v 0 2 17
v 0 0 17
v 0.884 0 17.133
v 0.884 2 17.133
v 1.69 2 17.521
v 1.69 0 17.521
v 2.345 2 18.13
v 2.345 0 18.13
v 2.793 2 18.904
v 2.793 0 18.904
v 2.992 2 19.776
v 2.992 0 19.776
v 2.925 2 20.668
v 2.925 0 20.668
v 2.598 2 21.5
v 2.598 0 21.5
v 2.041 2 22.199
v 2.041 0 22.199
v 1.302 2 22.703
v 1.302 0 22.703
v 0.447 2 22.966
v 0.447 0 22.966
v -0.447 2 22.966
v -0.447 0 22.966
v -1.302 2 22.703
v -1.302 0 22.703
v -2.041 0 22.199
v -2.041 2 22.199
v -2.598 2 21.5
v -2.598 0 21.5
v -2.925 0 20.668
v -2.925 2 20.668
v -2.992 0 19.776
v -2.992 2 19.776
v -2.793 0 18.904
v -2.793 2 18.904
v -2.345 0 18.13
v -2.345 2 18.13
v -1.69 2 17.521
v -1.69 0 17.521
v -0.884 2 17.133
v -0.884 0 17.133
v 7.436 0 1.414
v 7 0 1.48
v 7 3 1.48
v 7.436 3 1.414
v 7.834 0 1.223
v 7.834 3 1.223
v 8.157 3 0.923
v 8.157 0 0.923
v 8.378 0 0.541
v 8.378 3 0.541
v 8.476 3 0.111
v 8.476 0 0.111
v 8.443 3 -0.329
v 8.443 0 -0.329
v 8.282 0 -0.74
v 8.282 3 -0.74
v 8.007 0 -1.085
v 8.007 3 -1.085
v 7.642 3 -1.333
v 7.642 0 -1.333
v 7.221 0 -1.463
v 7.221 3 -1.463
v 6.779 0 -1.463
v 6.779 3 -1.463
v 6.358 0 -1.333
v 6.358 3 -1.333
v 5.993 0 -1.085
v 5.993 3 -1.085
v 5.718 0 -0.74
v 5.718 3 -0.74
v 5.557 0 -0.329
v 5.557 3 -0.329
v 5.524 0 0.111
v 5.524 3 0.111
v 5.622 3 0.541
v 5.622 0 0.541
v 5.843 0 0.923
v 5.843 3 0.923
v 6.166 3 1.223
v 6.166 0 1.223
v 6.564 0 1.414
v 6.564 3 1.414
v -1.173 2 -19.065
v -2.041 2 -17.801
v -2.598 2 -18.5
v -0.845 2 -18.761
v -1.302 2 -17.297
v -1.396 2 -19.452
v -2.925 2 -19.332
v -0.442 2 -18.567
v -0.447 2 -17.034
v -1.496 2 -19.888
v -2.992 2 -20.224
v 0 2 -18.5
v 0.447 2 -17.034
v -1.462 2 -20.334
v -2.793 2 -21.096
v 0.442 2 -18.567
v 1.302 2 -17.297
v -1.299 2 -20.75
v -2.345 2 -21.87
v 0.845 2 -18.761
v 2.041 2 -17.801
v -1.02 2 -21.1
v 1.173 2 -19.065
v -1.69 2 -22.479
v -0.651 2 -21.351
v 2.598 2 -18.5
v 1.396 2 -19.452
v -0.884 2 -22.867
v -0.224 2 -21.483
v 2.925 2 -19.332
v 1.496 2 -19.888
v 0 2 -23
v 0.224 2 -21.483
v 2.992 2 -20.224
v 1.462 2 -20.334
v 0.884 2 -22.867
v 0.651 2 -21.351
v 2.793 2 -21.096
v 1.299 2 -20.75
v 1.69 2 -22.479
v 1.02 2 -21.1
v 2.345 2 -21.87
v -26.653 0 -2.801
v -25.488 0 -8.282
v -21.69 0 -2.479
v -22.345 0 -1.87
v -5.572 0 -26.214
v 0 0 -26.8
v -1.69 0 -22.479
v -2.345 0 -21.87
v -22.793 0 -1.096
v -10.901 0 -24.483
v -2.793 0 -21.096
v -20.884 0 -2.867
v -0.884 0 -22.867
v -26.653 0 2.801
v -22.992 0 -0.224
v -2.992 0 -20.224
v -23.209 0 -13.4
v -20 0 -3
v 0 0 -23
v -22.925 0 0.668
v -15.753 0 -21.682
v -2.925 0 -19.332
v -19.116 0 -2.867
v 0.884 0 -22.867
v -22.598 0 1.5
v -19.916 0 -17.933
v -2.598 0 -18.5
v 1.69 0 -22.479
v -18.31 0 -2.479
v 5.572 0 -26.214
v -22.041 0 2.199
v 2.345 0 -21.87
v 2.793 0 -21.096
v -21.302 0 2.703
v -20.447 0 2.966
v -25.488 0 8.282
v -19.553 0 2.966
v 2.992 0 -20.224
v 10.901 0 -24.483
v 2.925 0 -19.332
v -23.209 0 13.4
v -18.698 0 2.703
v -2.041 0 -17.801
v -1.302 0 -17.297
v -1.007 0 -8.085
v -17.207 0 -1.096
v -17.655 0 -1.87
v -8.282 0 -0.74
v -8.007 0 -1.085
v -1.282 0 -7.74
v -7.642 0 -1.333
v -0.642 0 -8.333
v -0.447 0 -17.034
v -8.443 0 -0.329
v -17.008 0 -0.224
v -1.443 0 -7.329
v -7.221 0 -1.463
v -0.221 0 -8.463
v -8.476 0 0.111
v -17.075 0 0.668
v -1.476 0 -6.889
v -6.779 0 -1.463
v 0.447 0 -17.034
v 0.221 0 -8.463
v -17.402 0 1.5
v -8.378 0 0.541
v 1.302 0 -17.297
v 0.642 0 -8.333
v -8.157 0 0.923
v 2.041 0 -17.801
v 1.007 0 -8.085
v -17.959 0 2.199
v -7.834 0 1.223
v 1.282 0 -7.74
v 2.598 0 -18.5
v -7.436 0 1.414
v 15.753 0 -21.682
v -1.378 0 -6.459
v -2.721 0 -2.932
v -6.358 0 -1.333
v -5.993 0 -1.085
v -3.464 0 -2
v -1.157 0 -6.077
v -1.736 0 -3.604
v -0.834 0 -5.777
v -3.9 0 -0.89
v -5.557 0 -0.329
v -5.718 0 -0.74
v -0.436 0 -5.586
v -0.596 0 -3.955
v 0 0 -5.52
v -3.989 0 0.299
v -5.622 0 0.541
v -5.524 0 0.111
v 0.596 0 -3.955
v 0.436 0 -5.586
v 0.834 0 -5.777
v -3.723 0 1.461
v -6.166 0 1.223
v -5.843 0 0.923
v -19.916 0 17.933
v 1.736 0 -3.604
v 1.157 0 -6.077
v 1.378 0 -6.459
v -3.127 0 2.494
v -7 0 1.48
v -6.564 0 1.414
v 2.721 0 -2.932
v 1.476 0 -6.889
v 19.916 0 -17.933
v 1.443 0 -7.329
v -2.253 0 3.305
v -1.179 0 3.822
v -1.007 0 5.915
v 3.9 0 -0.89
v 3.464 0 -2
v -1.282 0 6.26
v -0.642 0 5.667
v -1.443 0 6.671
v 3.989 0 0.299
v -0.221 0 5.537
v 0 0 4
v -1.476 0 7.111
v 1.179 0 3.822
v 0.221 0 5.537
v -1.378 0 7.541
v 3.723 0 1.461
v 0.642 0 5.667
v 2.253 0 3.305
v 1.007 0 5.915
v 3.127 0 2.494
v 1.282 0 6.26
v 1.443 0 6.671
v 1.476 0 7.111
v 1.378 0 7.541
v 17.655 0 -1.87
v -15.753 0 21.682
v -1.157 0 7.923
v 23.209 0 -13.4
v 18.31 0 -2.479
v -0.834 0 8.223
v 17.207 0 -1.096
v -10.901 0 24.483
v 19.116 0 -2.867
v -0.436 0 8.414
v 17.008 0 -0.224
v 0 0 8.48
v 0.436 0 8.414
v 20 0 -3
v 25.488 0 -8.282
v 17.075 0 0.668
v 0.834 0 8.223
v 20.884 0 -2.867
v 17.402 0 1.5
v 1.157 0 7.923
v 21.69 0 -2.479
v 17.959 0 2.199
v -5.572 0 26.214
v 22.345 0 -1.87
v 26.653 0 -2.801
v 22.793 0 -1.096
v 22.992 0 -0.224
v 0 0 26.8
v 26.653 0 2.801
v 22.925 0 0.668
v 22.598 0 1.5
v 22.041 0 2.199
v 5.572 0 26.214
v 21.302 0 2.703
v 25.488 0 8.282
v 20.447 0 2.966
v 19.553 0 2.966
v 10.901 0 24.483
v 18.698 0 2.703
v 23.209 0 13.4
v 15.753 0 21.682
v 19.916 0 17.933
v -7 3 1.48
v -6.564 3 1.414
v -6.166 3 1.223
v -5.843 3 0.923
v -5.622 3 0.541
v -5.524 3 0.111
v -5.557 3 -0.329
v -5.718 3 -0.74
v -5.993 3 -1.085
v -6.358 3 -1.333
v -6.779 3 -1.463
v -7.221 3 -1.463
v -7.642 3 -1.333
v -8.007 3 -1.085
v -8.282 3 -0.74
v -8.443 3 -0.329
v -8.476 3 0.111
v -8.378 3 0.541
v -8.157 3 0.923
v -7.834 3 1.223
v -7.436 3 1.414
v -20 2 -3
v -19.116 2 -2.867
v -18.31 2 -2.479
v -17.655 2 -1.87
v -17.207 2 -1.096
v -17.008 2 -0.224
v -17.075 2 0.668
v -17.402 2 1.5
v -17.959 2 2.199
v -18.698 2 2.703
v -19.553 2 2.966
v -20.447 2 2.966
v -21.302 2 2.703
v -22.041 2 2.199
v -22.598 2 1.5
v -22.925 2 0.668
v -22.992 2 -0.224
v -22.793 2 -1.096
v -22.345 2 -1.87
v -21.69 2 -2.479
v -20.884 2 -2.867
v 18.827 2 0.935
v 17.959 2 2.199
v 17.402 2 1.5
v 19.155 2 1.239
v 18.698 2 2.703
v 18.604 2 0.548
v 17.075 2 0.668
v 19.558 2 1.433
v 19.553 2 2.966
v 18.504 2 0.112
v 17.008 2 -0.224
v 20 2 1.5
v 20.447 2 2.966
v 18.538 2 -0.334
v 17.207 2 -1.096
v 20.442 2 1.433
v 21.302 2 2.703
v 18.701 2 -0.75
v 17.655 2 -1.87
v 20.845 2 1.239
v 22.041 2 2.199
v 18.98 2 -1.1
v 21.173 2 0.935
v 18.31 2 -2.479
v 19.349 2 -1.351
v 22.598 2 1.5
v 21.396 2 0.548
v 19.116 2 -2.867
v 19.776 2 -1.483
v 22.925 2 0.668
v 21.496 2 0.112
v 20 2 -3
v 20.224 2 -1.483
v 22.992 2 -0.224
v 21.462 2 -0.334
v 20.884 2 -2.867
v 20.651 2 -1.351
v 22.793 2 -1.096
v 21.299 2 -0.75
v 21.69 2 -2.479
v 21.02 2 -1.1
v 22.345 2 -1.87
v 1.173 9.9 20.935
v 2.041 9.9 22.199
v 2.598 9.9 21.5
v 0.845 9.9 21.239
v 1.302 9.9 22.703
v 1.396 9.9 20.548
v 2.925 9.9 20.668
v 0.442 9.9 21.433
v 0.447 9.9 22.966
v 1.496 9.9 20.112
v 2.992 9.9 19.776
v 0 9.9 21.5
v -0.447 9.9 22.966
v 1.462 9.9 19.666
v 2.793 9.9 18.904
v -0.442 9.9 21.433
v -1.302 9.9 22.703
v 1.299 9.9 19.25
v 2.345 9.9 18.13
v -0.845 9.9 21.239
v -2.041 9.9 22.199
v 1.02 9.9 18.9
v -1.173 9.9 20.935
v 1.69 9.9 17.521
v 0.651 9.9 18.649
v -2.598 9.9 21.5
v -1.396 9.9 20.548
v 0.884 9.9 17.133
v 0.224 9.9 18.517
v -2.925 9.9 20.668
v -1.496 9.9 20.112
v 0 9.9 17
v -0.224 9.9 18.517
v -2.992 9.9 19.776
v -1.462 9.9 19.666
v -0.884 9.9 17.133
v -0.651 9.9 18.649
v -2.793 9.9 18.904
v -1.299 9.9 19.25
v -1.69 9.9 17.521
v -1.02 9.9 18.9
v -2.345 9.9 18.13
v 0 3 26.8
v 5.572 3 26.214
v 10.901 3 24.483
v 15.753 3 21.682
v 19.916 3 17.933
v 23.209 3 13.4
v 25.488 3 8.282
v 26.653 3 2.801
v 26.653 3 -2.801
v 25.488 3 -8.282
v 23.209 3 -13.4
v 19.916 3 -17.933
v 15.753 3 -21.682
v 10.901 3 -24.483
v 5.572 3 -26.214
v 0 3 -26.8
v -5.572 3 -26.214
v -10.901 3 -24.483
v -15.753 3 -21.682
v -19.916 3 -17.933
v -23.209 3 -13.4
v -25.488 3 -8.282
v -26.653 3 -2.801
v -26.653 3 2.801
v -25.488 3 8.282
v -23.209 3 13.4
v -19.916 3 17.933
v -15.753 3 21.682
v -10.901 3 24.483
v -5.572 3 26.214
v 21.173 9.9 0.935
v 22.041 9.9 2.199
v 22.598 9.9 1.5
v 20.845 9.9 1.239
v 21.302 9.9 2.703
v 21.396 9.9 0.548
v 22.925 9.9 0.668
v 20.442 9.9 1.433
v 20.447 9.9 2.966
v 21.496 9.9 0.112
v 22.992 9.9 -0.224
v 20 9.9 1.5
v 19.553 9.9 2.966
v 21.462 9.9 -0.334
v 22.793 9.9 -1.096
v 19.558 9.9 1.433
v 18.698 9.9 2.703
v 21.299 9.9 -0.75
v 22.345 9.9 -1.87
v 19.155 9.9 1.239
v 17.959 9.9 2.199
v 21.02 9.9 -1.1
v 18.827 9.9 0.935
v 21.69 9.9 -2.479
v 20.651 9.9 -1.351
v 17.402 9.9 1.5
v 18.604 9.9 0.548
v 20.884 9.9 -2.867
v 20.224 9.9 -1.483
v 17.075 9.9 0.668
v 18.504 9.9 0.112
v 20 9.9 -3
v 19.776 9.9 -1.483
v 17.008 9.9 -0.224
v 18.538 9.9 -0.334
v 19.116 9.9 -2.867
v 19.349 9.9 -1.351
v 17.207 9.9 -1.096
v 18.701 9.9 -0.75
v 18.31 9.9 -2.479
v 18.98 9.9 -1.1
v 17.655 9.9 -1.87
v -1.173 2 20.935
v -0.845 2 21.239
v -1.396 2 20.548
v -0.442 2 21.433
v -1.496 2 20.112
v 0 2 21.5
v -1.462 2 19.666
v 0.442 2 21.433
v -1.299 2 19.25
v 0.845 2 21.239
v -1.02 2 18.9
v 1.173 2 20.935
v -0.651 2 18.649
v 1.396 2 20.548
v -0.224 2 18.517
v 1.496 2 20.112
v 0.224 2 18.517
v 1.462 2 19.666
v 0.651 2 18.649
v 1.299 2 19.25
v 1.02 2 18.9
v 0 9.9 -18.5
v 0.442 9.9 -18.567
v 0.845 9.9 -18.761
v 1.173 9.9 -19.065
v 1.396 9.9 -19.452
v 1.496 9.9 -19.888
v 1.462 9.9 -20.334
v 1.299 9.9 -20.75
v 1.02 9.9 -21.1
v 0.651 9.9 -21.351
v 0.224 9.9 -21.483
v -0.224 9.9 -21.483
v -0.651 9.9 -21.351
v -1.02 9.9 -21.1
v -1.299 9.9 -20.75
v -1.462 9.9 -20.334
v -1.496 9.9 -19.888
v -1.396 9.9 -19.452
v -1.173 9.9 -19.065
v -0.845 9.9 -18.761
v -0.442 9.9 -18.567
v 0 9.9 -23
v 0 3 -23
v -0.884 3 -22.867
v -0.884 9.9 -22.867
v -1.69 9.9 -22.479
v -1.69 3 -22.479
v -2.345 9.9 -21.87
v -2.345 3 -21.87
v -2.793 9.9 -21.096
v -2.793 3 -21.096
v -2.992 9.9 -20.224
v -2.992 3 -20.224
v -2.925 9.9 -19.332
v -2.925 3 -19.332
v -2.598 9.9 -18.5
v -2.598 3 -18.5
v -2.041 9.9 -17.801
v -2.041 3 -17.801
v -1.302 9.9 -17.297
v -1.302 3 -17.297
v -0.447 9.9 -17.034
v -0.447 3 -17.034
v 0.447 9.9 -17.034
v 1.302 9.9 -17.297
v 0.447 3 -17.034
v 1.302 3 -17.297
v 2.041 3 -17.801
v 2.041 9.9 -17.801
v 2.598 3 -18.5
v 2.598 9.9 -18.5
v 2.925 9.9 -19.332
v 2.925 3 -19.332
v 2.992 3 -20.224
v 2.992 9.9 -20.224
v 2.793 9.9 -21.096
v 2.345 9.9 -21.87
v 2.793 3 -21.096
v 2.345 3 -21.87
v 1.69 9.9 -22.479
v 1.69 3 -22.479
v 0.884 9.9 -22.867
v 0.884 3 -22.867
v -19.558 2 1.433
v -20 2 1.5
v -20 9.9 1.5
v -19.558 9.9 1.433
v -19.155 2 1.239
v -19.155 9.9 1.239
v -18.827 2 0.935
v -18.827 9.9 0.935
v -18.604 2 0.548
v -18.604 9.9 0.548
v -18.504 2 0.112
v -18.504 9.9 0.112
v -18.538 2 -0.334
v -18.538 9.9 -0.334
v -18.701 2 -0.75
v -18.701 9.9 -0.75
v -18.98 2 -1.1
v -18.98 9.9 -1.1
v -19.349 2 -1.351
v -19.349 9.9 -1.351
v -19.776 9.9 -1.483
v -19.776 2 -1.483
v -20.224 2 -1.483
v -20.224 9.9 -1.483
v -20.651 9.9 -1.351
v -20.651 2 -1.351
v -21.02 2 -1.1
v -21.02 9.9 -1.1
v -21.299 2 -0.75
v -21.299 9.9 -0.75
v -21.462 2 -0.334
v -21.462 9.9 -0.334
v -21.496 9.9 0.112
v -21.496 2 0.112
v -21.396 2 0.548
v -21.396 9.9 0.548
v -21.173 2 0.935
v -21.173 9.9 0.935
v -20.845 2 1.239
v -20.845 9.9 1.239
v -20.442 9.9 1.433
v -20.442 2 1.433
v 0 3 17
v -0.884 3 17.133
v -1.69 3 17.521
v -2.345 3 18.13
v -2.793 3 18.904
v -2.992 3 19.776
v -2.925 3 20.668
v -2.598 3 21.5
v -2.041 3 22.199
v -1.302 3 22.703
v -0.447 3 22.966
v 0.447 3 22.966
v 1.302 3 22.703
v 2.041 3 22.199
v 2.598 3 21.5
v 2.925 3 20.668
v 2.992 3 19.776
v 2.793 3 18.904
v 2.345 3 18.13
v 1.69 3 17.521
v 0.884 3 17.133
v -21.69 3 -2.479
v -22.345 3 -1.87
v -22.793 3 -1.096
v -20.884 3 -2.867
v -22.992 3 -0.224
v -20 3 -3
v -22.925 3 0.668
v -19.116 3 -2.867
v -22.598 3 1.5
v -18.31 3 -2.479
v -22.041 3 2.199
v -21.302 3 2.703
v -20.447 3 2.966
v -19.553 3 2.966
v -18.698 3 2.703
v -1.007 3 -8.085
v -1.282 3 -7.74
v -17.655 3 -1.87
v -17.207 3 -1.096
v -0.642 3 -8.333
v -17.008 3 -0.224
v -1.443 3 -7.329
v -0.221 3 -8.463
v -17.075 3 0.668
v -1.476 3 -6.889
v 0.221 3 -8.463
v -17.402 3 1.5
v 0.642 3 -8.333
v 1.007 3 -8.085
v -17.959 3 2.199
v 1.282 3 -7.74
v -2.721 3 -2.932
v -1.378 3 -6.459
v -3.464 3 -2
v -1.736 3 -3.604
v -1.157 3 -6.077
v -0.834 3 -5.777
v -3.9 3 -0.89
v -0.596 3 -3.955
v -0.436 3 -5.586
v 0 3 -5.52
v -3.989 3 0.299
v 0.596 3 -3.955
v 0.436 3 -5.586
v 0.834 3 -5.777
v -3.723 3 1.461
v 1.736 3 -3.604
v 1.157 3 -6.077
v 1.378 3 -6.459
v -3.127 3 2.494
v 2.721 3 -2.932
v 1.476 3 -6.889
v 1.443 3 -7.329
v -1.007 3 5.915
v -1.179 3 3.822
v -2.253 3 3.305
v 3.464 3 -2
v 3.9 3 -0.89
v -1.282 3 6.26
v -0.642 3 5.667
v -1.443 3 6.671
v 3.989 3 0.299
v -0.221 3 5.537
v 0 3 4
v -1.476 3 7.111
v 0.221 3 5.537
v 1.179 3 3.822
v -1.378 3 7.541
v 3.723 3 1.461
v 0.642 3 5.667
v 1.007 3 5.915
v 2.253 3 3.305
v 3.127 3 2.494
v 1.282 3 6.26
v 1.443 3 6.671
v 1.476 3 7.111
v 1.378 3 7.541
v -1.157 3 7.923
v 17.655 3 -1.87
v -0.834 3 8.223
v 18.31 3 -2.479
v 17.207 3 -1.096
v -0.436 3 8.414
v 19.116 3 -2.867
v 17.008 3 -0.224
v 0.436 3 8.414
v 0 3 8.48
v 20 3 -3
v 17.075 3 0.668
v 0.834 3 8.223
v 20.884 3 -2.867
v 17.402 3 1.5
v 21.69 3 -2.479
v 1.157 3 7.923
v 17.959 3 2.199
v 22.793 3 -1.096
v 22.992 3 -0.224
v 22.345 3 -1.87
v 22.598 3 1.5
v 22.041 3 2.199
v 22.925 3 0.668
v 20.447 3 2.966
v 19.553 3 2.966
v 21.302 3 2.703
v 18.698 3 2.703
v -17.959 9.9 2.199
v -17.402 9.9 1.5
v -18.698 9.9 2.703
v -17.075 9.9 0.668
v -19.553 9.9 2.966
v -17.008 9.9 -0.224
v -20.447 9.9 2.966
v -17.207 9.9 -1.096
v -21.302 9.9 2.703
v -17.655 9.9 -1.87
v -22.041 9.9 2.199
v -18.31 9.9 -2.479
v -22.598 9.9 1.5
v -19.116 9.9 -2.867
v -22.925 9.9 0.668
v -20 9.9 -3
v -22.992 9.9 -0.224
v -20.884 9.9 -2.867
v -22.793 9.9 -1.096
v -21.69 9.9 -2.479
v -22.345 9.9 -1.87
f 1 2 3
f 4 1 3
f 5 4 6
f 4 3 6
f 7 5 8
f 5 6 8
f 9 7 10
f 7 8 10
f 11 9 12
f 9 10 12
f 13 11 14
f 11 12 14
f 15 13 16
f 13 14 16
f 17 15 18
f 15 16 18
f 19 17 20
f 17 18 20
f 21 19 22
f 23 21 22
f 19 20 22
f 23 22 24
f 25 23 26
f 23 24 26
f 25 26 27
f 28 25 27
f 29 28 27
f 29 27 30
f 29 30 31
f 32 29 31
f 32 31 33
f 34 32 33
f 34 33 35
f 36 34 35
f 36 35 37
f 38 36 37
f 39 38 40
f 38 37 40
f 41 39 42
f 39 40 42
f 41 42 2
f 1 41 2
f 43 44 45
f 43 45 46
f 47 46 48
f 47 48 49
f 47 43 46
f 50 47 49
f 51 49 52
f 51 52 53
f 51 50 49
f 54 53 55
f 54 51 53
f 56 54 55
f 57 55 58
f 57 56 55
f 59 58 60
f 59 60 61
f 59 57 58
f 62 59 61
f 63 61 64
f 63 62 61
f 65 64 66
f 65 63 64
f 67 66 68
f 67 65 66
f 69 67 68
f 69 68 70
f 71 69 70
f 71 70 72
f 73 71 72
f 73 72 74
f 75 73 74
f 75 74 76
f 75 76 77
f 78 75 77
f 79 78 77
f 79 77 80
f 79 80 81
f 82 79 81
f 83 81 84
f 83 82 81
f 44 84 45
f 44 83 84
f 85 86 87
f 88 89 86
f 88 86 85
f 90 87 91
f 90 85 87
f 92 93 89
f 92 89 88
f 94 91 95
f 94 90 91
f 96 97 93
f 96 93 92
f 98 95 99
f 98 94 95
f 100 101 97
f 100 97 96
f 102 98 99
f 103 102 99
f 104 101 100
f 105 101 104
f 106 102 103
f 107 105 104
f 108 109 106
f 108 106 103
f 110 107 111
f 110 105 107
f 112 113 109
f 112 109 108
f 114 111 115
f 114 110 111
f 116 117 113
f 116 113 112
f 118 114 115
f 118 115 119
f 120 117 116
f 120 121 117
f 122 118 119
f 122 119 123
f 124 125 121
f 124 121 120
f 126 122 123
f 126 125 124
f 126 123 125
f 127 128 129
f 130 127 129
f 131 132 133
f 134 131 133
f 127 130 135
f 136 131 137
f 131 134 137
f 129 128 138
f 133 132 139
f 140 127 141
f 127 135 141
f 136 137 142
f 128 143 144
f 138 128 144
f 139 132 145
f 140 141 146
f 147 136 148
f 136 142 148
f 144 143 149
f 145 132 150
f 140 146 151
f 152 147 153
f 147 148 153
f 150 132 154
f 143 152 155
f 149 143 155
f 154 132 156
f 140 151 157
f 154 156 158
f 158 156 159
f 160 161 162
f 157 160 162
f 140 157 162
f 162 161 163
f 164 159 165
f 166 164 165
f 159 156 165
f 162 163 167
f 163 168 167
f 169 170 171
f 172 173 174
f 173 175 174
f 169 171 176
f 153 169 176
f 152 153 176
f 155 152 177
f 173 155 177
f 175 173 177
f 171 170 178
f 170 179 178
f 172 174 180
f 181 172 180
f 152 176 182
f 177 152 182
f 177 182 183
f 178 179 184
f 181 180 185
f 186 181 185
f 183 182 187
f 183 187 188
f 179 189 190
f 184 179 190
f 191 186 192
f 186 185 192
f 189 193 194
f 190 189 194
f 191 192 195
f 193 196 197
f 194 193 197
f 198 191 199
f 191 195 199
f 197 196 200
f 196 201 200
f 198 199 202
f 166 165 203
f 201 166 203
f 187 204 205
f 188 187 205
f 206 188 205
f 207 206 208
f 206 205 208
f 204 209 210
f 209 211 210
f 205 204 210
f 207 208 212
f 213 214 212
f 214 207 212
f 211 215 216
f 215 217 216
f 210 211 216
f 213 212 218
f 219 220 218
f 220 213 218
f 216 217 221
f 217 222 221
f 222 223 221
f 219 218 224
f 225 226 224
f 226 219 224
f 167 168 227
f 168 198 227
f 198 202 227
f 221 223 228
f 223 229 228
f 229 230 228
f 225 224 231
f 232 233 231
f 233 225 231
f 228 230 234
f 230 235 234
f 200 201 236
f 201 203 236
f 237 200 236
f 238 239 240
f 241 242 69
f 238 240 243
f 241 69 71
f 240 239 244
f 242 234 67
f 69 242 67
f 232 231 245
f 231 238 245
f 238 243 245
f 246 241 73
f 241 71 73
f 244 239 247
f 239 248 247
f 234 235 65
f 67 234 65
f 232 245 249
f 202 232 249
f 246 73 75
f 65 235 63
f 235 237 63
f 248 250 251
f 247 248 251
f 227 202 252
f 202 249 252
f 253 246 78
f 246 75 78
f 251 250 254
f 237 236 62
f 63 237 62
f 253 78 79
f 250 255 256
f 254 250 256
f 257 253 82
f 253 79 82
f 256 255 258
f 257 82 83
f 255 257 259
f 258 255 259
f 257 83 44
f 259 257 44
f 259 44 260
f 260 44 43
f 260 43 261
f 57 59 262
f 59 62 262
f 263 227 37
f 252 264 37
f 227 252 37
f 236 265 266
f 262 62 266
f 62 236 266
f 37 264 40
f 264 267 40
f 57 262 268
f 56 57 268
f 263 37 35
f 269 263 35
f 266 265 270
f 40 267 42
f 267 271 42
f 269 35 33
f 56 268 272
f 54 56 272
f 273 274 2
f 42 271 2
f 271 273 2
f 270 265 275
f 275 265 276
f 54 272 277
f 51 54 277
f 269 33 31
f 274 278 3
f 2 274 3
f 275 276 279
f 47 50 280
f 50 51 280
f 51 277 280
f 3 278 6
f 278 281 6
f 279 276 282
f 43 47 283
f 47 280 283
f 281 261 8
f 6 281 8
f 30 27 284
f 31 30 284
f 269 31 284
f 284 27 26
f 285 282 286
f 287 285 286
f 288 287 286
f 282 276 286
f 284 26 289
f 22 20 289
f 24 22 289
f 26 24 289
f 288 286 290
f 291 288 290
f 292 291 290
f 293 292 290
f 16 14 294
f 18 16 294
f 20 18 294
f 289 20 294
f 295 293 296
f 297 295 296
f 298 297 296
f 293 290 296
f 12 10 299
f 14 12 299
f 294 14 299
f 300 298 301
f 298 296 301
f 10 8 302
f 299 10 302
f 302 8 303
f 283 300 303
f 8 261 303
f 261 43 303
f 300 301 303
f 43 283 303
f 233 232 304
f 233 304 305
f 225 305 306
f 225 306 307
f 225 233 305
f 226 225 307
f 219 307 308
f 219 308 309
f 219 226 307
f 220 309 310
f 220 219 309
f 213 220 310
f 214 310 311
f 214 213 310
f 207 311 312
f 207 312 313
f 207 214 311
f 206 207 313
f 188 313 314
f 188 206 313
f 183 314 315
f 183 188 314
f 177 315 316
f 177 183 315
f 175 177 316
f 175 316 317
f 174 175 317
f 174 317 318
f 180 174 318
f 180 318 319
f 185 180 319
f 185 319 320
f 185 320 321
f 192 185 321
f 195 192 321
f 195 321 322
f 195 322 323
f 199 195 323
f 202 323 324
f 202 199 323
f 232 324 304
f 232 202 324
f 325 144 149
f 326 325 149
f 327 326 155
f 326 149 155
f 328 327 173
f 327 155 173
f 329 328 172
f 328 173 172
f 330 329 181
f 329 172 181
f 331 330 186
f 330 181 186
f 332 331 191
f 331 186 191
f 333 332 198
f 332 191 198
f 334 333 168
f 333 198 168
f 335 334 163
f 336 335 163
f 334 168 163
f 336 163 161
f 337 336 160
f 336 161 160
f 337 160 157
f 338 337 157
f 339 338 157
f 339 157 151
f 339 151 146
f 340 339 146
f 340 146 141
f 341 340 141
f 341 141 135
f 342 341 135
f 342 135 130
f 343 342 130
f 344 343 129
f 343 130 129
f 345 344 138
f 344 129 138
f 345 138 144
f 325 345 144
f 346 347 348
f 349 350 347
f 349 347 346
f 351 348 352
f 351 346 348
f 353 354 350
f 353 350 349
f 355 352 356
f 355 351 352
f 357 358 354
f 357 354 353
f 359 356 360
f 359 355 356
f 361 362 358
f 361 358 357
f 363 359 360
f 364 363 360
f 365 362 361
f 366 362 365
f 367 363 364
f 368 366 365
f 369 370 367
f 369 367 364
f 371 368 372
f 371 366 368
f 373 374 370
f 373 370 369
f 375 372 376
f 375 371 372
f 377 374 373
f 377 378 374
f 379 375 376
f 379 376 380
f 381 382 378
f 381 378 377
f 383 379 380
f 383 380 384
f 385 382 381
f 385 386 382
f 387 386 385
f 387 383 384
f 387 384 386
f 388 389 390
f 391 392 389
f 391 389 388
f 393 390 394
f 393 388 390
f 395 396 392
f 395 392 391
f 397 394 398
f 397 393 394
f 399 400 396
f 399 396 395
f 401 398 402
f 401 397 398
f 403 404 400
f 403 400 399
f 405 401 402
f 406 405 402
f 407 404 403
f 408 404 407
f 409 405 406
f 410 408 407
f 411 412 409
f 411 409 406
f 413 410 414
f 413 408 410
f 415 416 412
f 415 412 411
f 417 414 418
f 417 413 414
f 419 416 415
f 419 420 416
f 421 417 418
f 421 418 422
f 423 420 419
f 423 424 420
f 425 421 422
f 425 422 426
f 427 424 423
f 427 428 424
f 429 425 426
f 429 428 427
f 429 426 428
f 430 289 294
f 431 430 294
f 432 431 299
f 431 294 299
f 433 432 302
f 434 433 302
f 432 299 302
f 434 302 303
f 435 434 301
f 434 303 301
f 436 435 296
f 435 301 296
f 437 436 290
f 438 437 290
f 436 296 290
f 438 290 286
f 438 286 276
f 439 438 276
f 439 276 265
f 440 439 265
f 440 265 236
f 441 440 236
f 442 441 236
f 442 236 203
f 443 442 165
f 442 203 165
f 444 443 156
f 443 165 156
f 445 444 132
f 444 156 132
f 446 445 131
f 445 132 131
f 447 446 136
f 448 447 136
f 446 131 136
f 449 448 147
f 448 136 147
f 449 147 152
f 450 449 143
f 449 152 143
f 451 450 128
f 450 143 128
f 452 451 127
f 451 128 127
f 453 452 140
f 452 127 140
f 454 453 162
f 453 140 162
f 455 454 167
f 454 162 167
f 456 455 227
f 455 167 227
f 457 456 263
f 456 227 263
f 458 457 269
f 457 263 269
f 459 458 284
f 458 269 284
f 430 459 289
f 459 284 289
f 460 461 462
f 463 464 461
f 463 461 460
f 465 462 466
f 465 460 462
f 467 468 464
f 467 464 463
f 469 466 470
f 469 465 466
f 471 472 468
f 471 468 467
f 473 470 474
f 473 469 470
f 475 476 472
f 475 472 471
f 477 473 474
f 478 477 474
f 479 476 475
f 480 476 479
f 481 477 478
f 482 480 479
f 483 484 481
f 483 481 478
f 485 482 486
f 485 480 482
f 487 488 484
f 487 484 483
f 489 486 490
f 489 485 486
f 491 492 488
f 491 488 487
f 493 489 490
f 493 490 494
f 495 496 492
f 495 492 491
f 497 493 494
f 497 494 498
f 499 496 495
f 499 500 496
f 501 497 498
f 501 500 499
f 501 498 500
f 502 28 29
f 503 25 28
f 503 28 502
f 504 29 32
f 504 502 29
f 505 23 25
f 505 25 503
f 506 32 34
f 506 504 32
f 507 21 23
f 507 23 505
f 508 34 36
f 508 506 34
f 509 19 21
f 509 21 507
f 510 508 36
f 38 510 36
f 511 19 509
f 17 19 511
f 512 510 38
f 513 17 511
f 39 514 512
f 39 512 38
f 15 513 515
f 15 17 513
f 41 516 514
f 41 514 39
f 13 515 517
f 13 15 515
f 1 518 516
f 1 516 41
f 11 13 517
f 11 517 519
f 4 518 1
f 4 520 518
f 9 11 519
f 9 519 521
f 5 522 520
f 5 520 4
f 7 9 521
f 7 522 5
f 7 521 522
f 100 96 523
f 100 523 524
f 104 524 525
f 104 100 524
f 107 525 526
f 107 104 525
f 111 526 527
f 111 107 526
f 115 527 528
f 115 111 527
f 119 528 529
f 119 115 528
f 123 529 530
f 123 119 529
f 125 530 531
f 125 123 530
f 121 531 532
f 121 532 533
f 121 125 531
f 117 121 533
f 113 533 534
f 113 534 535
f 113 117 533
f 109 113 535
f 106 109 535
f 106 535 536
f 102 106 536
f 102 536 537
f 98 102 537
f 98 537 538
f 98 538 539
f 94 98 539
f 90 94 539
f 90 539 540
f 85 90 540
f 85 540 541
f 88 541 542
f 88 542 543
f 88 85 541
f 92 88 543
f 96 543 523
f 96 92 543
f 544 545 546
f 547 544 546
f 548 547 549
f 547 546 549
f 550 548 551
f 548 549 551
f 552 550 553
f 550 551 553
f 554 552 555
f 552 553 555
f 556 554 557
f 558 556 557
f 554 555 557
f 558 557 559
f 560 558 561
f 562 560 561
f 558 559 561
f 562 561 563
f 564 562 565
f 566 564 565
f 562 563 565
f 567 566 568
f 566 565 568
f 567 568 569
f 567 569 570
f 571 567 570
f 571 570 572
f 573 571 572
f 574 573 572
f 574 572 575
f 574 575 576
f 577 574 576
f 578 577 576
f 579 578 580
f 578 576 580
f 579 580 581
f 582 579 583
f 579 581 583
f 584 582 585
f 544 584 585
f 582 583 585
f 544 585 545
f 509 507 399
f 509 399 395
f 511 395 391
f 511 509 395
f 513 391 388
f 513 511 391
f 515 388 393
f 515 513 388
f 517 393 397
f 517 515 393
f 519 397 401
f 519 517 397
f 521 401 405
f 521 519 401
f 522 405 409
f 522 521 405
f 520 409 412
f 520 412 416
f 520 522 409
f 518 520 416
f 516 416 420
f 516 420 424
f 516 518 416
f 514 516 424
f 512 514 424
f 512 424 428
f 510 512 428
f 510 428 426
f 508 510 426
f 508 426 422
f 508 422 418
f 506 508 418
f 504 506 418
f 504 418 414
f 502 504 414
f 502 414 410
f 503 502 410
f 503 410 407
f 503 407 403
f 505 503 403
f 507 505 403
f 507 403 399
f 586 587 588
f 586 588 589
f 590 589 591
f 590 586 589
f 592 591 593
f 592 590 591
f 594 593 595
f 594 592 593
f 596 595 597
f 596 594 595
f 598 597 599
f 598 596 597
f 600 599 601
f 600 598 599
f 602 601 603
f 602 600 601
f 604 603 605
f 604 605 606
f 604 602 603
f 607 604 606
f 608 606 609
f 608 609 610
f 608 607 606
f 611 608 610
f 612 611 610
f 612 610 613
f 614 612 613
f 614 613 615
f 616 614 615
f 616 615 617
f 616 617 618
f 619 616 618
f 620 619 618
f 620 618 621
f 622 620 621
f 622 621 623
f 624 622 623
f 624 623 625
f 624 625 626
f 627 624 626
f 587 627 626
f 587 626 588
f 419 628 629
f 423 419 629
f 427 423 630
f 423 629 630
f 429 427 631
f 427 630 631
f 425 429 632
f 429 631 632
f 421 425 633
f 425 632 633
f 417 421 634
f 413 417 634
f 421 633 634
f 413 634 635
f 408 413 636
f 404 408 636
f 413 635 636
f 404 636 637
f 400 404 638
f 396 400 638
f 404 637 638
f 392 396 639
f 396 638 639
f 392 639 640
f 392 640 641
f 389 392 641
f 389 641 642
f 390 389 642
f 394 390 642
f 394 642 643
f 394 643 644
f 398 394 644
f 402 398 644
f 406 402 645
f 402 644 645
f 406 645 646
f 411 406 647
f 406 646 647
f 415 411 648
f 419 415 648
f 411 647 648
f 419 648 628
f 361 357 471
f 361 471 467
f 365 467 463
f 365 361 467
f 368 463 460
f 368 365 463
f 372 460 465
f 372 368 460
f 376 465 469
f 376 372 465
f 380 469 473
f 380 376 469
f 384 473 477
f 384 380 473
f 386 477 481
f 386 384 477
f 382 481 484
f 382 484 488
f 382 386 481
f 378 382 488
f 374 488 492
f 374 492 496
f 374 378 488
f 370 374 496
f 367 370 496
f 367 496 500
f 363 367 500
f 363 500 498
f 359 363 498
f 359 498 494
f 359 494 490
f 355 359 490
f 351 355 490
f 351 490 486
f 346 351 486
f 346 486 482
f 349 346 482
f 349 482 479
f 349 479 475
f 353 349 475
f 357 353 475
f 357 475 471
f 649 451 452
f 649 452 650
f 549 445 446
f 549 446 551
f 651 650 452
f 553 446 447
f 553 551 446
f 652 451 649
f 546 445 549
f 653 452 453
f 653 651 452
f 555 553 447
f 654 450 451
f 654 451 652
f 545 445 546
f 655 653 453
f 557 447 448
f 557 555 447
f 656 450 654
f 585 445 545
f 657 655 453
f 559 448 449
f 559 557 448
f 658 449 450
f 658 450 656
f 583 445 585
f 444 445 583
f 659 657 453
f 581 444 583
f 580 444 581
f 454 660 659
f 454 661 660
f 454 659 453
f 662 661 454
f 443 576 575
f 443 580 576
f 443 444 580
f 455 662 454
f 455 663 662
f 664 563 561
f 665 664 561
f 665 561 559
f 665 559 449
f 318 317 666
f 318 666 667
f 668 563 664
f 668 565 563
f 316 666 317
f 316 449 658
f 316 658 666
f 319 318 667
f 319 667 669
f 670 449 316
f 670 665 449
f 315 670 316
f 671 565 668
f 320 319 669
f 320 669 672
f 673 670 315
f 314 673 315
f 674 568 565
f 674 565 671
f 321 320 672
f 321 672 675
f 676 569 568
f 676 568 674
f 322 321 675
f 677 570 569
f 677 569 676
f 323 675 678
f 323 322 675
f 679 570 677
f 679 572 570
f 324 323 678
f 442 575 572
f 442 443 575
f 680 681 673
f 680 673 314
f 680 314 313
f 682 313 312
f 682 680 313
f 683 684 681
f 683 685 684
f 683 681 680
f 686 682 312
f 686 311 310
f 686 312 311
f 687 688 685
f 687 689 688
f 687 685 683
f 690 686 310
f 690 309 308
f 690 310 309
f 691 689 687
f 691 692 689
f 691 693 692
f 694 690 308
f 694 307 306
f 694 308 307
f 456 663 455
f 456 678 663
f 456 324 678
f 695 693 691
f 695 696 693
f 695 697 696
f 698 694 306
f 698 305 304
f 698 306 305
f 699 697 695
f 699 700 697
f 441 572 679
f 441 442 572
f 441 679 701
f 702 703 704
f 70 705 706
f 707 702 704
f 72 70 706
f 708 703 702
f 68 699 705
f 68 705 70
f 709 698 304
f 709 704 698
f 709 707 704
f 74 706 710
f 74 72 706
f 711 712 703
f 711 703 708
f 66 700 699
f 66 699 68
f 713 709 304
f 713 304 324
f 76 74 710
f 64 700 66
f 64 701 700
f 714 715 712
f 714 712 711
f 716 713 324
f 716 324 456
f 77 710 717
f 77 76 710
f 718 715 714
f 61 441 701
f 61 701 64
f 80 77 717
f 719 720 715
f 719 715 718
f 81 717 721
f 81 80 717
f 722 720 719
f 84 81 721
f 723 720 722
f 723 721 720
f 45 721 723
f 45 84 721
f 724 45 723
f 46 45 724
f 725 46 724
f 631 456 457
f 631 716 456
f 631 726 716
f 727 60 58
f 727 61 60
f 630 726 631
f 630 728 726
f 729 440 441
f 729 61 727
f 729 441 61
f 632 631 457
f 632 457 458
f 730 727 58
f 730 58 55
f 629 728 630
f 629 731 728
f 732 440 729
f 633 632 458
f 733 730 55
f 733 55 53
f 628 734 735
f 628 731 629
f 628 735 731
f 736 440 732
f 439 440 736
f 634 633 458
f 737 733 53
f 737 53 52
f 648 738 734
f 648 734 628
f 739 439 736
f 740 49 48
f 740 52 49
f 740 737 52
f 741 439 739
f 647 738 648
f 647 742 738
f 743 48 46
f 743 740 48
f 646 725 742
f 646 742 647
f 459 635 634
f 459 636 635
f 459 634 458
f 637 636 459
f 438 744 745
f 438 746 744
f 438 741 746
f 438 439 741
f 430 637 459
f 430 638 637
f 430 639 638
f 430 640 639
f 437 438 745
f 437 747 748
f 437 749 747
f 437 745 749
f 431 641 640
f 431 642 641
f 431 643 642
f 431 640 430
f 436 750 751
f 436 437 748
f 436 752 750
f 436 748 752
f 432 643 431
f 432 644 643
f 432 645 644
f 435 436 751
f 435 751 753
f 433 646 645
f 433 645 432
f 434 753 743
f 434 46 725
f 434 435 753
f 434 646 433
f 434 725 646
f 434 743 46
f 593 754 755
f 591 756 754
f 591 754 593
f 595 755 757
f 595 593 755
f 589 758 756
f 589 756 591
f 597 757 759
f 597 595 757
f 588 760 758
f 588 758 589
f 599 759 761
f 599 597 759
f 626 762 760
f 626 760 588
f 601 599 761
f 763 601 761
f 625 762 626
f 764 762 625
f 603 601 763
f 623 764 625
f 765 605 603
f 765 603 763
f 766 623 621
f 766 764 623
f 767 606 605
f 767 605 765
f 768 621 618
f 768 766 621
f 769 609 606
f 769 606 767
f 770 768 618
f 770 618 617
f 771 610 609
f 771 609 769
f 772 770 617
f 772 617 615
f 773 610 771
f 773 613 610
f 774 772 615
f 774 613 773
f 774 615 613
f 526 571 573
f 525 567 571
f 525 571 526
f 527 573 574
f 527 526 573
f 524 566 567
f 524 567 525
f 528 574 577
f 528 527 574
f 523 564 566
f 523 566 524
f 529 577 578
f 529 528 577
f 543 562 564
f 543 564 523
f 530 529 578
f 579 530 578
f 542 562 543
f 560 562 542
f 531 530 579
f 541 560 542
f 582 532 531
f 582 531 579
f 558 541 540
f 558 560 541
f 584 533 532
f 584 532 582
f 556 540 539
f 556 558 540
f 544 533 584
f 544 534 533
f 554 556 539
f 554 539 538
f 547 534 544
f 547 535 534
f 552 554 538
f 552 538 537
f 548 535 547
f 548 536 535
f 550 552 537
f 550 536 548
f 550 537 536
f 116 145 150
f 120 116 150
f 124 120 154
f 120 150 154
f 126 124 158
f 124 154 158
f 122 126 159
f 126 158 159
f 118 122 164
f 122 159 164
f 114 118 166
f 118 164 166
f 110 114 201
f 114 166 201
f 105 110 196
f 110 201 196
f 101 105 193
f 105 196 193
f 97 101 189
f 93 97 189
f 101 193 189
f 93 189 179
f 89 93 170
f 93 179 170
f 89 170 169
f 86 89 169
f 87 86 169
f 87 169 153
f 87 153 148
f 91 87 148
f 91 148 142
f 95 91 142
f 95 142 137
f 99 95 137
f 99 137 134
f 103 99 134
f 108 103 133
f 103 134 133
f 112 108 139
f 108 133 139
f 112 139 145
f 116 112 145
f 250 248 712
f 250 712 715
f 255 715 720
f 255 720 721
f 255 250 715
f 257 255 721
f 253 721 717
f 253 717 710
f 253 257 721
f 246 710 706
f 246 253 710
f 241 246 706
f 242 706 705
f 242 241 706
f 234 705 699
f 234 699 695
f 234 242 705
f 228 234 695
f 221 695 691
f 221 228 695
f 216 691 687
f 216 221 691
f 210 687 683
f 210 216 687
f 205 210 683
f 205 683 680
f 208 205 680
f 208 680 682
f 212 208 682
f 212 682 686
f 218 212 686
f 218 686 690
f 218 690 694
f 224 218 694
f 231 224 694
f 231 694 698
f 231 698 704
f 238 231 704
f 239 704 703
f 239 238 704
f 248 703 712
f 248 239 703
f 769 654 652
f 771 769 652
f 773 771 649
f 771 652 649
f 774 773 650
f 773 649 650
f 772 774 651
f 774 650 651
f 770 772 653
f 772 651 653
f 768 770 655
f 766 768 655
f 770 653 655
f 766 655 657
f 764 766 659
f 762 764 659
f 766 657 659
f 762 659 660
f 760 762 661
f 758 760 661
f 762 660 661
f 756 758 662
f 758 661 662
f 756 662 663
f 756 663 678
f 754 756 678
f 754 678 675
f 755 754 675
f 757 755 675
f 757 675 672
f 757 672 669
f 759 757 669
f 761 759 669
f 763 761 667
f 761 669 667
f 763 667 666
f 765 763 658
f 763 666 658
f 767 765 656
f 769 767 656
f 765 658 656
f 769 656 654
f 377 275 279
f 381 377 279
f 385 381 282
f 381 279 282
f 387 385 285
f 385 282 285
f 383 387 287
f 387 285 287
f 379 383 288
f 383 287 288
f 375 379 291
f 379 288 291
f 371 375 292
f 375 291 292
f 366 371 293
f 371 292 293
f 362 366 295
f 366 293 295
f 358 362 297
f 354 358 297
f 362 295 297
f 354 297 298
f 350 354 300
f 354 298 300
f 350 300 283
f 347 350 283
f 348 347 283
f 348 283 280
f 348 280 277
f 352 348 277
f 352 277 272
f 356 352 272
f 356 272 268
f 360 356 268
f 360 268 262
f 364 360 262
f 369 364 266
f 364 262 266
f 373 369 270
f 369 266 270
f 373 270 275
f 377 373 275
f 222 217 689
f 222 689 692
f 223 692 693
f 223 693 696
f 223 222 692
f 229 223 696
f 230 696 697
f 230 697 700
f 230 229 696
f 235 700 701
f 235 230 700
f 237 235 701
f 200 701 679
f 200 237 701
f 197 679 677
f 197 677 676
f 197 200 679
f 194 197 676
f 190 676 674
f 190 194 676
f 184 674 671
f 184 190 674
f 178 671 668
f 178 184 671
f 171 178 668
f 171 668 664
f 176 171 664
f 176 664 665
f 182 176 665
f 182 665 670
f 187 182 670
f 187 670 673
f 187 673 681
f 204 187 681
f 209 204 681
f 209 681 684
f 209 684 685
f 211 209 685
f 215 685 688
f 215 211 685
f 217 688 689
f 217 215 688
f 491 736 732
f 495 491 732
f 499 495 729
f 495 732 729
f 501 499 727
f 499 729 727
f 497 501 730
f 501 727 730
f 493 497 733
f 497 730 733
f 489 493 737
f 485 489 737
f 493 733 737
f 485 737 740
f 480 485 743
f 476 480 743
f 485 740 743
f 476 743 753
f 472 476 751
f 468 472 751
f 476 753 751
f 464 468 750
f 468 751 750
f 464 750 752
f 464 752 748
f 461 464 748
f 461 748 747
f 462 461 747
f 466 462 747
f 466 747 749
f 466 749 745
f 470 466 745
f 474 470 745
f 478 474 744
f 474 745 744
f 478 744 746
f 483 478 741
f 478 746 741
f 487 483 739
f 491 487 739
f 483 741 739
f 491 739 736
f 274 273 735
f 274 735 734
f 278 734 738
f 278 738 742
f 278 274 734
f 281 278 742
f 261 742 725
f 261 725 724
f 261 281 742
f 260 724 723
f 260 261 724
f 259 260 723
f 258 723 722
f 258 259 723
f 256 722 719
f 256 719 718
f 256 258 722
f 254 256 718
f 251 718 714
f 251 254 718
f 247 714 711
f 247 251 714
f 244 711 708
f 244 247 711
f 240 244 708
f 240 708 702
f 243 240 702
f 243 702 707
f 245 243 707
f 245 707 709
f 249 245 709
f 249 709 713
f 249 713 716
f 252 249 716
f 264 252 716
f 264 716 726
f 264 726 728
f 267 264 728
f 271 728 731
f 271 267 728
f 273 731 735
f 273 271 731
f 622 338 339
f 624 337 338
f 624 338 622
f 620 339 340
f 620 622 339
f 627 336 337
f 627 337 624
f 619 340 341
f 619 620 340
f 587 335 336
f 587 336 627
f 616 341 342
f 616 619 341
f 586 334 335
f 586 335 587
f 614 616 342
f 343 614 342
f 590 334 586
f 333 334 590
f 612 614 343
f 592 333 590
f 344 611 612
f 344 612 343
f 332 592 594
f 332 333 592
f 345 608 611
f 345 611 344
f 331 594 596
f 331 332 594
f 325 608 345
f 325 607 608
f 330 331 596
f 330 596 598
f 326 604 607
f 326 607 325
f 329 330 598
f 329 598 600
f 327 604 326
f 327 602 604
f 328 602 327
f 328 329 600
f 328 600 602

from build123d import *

# Parameters (mm, degrees)
SKETCH_1_R          = 26.8
SKETCH_1_R_2        = 4
SKETCH_1_R_3        = 1.48
SKETCH_1_R_4        = 1.5
EXTRUDE_1_DEPTH     = 3
SKETCH_2_R          = 3
SKETCH_2_R_2        = 1.5
EXTRUDE_2_DEPTH     = 6.9
SKETCH_3_R          = 3
CUT_EXTRUDE_1_DEPTH = 2


with BuildPart() as part:
    # 草图1 → 凸台-拉伸1 (new body)
    with BuildSketch(Plane(origin=(0, 0, 0), x_dir=(1, 0, 0), z_dir=(0, 1, 0))):
        with Locations(Location((0, 0, 0), (0, 0, 270))):
            Circle(SKETCH_1_R)
        with Locations(Location((0, 0, 0), (0, 0, 270))):
            Circle(SKETCH_1_R_2, mode=Mode.SUBTRACT)
        with Locations(Location((0, 7, 0), (0, 0, 270))):
            Circle(SKETCH_1_R_3, mode=Mode.SUBTRACT)
        with Locations(Location((0, 20, 0), (0, 0, 270))):
            Circle(SKETCH_1_R_4, mode=Mode.SUBTRACT)
        with Locations(Location((0, -7, 0), (0, 0, 270))):
            Circle(SKETCH_1_R_3, mode=Mode.SUBTRACT)
        with Locations(Location((7, 0, 0), (0, 0, 270))):
            Circle(SKETCH_1_R_3, mode=Mode.SUBTRACT)
        with Locations(Location((20, 0, 0), (0, 0, 270))):
            Circle(SKETCH_1_R_4, mode=Mode.SUBTRACT)
        with Locations(Location((0, -20, 0), (0, 0, 270))):
            Circle(SKETCH_1_R_4, mode=Mode.SUBTRACT)
        with Locations(Location((-20, 0, 0), (0, 0, 270))):
            Circle(SKETCH_1_R_4, mode=Mode.SUBTRACT)
        with Locations(Location((-7, 0, 0), (0, 0, 270))):
            Circle(SKETCH_1_R_3, mode=Mode.SUBTRACT)
    extrude(amount=EXTRUDE_1_DEPTH)

    # 草图2 → 凸台-拉伸2 (add)
    # profile 1 of 4: a face of its own
    with BuildSketch(Plane(origin=(0, 3, 0), x_dir=(1, 0, 0), z_dir=(0, 1, 0))):
        with Locations(Location((0, 20, 0), (0, 0, 90))):
            Circle(SKETCH_2_R)
        with Locations(Location((0, 20, 0), (0, 0, 270))):
            Circle(SKETCH_2_R_2, mode=Mode.SUBTRACT)
    # profile 2 of 4: a face of its own
    with BuildSketch(Plane(origin=(0, 3, 0), x_dir=(1, 0, 0), z_dir=(0, 1, 0))):
        with Locations(Location((-20, 0, 0), (0, 0, 90))):
            Circle(SKETCH_2_R)
        with Locations(Location((-20, 0, 0), (0, 0, 270))):
            Circle(SKETCH_2_R_2, mode=Mode.SUBTRACT)
    # profile 3 of 4: a face of its own
    with BuildSketch(Plane(origin=(0, 3, 0), x_dir=(1, 0, 0), z_dir=(0, 1, 0))):
        with Locations(Location((20, 0, 0), (0, 0, 90))):
            Circle(SKETCH_2_R)
        with Locations(Location((20, 0, 0), (0, 0, 270))):
            Circle(SKETCH_2_R_2, mode=Mode.SUBTRACT)
    # profile 4 of 4: a face of its own
    with BuildSketch(Plane(origin=(0, 3, 0), x_dir=(1, 0, 0), z_dir=(0, 1, 0))):
        with Locations(Location((0, -20, 0), (0, 0, 90))):
            Circle(SKETCH_2_R)
        with Locations(Location((0, -20, 0), (0, 0, 270))):
            Circle(SKETCH_2_R_2, mode=Mode.SUBTRACT)
    extrude(amount=EXTRUDE_2_DEPTH)

    # 草图3 → 切除-拉伸1 (cut)
    with BuildSketch(Plane.XZ):
        with Locations(Location((0, 20, 0), (0, 0, 270))):
            Circle(SKETCH_3_R)
        with Locations(Location((-20, 0, 0), (0, 0, 270))):
            Circle(SKETCH_3_R)
        with Locations(Location((0, -20, 0), (0, 0, 270))):
            Circle(SKETCH_3_R)
        with Locations(Location((20, 0, 0), (0, 0, 270))):
            Circle(SKETCH_3_R)
    extrude(amount=-CUT_EXTRUDE_1_DEPTH, mode=Mode.SUBTRACT)


solid = part.part
